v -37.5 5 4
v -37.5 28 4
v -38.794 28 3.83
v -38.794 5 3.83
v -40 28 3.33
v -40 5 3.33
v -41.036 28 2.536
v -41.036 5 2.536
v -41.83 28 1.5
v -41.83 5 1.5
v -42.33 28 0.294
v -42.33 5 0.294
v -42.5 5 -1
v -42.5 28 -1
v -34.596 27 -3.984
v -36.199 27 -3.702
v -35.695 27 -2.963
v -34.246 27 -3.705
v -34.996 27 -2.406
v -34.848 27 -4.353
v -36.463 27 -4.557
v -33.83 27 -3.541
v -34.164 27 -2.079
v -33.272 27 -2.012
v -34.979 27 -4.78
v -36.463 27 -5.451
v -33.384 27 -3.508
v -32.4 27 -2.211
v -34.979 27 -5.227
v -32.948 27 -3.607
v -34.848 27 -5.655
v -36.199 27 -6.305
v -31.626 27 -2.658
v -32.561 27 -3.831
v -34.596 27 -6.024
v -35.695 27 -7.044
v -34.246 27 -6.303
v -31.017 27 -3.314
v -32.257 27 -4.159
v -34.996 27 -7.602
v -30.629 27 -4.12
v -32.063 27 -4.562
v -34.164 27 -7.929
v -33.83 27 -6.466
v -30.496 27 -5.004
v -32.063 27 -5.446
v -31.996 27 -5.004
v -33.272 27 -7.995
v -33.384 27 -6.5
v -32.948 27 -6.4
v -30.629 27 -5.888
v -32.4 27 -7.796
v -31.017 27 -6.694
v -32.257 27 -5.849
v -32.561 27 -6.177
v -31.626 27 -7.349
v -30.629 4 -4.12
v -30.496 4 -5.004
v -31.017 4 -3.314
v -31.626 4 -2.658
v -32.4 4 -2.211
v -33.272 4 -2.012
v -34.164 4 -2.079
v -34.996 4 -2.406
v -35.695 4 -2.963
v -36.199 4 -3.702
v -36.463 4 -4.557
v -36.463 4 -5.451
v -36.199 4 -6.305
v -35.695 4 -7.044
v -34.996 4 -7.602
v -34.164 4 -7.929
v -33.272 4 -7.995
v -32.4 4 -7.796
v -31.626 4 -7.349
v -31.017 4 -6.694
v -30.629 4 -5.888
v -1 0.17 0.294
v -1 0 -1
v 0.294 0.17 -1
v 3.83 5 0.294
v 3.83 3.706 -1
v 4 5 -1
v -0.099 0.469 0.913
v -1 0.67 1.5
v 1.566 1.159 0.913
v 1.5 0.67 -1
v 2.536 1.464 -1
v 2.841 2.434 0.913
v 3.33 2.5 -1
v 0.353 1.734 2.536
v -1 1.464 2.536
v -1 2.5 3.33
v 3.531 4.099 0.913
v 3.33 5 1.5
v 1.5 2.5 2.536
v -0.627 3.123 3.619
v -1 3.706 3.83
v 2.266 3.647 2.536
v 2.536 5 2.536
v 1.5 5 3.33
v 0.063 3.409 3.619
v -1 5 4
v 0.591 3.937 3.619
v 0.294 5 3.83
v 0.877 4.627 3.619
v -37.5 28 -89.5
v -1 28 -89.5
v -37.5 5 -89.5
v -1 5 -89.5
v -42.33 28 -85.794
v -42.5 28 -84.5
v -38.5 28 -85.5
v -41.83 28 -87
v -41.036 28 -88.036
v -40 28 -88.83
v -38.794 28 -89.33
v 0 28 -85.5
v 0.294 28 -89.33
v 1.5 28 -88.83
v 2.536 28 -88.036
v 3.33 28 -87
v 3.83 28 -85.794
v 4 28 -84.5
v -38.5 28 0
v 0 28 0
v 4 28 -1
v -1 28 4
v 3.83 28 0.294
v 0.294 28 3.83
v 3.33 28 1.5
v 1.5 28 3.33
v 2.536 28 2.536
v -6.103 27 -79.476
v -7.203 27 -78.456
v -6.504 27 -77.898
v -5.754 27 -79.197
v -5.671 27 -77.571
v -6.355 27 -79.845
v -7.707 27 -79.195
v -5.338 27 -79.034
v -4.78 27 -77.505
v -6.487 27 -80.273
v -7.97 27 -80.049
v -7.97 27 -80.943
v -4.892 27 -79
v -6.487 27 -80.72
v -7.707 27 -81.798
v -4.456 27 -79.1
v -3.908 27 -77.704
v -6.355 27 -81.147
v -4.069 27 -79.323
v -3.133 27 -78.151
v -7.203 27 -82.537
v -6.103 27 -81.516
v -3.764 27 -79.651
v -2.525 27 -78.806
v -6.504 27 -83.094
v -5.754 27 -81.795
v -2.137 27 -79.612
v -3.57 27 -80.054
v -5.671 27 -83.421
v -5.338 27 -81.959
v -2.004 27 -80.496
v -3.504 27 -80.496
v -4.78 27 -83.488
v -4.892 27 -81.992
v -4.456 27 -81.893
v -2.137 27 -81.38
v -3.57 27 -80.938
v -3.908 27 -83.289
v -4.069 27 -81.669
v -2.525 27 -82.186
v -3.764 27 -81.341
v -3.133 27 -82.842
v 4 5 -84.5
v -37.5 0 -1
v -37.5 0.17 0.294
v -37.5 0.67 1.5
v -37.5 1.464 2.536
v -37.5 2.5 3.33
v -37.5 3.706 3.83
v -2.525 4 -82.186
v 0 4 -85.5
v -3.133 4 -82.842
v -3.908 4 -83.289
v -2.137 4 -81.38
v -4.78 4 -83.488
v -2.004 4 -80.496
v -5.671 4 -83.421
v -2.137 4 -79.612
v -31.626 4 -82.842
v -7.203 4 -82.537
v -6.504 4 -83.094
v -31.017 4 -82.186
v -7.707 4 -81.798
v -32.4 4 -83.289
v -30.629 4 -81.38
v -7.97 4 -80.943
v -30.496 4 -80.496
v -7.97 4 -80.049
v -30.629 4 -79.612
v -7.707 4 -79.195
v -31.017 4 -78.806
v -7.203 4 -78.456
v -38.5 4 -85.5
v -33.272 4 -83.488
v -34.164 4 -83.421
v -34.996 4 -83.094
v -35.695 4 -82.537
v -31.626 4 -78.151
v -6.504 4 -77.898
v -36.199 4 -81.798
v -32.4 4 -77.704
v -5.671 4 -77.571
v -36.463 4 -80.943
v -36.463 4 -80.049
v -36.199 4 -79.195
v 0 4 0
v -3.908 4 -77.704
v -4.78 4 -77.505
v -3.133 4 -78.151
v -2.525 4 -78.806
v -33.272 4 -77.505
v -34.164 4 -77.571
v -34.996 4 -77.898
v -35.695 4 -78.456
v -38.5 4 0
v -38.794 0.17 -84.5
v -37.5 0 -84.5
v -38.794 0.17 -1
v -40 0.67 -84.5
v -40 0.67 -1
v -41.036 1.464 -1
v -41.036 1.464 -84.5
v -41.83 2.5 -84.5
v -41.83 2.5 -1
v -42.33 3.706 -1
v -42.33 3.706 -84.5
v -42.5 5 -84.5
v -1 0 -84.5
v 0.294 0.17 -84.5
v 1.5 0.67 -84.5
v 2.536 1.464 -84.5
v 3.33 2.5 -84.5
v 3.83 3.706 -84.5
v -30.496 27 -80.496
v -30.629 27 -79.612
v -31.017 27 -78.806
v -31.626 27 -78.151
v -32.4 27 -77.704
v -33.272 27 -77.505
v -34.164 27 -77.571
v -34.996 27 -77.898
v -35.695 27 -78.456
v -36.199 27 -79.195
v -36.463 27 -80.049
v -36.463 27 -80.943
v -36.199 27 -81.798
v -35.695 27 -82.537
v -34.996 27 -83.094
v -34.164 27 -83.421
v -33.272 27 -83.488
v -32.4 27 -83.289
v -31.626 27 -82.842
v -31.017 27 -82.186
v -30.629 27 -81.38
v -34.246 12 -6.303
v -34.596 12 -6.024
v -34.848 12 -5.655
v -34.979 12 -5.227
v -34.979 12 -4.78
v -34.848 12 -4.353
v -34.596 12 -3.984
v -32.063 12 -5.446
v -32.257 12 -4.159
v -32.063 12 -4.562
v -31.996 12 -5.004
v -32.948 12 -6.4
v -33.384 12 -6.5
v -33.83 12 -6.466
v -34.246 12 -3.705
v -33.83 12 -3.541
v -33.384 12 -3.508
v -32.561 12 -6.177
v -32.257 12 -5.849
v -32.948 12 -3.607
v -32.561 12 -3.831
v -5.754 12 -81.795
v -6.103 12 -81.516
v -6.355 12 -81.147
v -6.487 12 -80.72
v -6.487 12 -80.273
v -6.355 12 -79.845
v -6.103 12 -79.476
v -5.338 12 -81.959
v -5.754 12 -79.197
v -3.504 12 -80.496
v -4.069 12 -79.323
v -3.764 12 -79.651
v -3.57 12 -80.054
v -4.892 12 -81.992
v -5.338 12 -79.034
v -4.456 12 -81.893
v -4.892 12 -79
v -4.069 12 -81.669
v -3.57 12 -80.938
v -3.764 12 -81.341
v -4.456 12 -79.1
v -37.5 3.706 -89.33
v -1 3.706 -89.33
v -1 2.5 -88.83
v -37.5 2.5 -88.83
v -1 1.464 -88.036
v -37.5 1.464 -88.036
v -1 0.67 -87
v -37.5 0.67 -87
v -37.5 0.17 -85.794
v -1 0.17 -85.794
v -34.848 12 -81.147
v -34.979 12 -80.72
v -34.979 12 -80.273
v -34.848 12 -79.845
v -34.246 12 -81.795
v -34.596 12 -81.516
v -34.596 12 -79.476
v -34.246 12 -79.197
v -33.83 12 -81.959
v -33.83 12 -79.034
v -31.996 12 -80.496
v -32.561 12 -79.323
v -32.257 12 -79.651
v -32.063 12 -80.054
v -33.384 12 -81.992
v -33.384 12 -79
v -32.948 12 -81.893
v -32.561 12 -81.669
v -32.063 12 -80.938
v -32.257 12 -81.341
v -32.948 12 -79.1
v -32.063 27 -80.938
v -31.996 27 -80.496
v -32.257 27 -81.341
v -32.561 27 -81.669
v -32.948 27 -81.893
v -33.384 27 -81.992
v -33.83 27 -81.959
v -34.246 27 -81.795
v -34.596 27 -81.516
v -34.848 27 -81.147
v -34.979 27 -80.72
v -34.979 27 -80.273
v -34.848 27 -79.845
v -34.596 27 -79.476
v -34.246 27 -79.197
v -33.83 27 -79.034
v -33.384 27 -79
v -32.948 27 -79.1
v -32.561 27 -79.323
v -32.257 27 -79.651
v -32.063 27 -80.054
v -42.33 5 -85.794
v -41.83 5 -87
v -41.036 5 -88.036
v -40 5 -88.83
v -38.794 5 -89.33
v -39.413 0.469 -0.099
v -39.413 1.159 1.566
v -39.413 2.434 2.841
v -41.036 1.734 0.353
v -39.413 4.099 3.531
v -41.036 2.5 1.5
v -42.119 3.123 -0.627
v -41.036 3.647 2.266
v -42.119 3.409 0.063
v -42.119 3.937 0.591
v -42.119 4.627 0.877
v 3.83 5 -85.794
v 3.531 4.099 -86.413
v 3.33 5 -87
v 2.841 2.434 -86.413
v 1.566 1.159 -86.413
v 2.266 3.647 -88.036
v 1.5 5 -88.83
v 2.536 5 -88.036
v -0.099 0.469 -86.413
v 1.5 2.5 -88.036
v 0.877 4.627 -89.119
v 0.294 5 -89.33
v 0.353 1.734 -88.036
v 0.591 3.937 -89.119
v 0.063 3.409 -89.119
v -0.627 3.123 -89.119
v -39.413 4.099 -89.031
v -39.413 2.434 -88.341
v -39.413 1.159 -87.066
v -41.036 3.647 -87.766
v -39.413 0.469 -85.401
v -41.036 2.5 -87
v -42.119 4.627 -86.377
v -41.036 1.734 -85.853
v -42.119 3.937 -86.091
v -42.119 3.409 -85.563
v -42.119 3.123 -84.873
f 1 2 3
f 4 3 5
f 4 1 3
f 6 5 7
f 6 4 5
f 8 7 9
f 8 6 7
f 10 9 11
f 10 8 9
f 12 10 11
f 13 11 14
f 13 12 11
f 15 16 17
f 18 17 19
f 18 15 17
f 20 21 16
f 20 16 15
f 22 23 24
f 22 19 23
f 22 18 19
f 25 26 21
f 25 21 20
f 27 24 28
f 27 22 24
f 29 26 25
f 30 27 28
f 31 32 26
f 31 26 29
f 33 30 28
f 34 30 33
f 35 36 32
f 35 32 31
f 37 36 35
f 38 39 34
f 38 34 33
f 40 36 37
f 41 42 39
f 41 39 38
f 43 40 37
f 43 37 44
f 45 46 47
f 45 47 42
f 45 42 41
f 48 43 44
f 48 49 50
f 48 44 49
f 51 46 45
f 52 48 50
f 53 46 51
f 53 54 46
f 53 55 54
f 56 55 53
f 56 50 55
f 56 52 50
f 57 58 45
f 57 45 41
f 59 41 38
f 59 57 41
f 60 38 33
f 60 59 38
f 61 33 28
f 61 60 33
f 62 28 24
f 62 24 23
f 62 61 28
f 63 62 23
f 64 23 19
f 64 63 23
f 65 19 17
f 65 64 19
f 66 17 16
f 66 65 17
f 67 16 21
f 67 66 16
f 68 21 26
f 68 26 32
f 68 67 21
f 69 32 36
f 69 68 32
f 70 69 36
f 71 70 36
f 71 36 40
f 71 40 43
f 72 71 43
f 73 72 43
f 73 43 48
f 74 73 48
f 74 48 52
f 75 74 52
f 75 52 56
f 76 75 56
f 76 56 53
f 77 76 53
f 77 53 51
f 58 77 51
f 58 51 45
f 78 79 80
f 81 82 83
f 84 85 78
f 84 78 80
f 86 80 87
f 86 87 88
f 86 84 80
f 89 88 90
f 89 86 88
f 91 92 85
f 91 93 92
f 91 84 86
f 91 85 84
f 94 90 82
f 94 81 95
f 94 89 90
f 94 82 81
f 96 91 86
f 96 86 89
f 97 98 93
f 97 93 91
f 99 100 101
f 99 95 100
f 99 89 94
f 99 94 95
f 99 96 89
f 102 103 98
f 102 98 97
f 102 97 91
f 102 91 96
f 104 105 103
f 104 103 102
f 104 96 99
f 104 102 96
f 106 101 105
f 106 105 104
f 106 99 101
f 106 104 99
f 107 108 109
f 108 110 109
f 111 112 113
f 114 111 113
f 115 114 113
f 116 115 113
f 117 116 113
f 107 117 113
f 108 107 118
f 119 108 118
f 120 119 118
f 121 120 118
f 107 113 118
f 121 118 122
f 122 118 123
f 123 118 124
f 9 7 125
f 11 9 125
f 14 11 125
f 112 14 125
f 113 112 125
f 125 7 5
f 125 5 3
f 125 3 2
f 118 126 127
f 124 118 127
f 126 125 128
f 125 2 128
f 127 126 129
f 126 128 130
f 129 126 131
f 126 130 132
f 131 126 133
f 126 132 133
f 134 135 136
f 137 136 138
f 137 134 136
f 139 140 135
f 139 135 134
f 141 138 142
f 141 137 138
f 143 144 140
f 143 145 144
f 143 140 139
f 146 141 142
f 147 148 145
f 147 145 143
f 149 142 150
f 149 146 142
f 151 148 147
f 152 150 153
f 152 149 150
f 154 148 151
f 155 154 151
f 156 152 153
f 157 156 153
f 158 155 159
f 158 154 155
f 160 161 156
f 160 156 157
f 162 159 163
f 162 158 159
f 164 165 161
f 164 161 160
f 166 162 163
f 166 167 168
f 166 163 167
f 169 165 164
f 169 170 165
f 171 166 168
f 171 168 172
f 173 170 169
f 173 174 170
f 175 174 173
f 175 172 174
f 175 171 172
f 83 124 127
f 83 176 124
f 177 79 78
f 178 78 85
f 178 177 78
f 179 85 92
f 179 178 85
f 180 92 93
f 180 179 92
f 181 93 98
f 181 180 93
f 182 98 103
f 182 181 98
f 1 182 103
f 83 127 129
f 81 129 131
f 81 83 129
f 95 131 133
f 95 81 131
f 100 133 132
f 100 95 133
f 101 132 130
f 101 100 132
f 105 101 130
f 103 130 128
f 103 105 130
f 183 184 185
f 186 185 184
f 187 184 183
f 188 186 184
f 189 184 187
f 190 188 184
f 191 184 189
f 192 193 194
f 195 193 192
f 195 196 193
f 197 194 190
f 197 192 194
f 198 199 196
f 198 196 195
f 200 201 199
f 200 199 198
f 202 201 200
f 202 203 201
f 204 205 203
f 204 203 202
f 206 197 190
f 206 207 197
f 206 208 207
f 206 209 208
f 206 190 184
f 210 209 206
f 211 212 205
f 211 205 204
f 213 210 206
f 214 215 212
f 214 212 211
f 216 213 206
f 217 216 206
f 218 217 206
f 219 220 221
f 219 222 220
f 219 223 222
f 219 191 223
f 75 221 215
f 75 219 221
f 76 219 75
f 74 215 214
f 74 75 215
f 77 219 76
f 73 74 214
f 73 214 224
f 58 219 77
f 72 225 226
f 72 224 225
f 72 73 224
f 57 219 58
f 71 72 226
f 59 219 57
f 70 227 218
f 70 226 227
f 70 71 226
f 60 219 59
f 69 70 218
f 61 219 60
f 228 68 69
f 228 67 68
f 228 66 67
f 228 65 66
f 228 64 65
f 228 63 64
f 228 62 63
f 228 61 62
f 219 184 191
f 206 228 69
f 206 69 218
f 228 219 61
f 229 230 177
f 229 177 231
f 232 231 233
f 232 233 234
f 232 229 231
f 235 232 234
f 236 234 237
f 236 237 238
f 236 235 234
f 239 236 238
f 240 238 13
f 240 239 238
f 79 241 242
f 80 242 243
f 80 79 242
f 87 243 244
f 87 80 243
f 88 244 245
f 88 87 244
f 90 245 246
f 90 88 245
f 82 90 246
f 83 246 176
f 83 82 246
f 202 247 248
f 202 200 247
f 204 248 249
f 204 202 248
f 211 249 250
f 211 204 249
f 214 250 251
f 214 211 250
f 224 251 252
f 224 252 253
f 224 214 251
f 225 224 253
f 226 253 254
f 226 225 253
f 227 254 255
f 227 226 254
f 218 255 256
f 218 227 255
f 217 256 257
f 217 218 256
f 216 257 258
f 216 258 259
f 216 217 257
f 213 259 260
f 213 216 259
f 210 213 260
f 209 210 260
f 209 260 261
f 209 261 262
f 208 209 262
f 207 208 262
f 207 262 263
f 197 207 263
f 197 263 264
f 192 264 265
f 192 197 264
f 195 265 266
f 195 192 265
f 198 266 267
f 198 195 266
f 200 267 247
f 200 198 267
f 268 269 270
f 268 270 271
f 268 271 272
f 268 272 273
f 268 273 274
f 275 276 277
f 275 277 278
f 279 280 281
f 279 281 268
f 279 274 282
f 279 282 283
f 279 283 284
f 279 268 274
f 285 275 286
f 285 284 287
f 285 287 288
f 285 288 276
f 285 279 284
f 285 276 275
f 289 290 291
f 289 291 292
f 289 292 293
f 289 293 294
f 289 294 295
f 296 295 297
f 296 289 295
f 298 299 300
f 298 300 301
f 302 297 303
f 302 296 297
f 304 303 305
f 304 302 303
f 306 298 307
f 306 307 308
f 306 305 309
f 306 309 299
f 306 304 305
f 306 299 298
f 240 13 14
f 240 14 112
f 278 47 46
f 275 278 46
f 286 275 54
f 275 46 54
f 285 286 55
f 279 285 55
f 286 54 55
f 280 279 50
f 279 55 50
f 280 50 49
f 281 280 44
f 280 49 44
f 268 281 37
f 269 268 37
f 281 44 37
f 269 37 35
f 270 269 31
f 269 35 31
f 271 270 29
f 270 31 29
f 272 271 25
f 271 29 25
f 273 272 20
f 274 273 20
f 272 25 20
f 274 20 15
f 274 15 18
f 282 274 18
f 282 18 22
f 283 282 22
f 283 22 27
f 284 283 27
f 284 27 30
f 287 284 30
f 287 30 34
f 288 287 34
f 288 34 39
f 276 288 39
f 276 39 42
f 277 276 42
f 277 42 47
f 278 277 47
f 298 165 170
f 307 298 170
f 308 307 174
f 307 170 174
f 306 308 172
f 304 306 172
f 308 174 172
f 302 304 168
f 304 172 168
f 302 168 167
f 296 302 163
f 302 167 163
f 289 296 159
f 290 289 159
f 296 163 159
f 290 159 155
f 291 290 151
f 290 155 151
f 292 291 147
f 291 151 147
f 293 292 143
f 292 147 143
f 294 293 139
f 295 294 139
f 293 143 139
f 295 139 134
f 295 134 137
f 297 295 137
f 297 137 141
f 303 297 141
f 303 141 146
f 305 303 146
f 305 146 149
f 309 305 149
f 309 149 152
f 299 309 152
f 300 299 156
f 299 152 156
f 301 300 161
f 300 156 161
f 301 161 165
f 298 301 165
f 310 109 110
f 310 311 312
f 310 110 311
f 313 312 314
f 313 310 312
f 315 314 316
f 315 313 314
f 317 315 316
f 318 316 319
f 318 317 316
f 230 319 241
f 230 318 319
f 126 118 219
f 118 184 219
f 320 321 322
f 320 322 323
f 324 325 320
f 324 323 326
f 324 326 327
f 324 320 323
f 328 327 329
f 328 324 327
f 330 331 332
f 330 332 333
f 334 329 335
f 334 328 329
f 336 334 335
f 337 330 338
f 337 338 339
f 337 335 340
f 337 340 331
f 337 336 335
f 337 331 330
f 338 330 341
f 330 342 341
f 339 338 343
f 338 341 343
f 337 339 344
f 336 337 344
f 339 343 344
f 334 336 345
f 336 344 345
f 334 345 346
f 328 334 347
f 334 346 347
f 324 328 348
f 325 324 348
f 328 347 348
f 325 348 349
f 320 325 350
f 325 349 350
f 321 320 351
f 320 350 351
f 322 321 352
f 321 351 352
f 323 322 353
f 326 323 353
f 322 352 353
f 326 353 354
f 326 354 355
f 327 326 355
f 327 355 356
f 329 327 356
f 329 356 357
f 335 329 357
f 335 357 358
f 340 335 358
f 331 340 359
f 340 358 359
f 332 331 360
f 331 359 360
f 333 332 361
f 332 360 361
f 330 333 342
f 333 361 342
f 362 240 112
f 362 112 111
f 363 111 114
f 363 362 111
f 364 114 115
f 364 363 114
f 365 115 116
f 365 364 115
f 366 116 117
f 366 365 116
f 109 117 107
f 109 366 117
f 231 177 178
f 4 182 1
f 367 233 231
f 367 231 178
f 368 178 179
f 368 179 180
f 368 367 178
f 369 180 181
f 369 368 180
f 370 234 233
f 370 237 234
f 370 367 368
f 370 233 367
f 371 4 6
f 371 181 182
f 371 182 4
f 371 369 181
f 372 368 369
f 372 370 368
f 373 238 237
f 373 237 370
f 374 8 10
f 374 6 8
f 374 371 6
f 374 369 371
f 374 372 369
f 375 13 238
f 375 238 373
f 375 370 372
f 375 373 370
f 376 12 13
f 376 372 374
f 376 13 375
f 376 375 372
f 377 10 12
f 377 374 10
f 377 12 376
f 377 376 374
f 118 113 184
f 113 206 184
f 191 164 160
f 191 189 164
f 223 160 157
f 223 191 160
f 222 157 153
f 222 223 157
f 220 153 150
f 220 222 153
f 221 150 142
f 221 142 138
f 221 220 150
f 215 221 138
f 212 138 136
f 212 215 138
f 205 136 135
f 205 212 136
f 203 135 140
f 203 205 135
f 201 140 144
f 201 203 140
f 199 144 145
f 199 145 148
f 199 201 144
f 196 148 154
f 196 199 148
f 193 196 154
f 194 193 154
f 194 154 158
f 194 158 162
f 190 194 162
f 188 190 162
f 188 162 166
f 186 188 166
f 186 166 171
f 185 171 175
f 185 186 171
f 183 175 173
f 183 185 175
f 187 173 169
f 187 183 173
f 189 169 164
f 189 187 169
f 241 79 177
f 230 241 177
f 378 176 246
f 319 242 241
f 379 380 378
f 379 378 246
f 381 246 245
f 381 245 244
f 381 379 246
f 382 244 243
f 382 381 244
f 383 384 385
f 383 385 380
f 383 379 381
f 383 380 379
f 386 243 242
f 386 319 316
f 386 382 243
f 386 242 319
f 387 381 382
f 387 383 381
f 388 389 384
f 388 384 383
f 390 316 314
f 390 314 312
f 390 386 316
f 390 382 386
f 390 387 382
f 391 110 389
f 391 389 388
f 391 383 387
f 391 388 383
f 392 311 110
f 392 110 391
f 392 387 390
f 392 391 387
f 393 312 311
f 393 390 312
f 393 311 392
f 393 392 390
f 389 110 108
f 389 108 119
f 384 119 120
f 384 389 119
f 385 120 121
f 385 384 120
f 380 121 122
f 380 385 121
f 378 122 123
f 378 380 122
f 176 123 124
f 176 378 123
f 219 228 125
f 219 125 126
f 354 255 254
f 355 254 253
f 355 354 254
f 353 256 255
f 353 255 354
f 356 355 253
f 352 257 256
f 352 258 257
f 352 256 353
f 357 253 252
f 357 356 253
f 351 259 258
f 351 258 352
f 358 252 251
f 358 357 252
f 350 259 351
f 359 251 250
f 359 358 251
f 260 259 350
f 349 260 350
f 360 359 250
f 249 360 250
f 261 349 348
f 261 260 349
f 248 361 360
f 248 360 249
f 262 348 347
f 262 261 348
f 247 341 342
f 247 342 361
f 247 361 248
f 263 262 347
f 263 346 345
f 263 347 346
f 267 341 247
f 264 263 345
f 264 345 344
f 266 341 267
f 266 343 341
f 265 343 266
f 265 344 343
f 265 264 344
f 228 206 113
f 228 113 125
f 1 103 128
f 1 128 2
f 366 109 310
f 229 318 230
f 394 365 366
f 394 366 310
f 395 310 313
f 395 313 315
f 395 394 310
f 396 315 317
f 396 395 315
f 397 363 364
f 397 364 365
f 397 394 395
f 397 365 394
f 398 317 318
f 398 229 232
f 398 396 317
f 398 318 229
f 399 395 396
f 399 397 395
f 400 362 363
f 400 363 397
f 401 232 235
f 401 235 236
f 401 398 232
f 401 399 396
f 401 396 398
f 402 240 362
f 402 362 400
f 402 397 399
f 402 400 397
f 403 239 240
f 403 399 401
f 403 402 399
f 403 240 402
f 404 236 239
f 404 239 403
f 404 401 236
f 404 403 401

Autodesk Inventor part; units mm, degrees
ref_plane "YZ Plane" through (0, 0, 0) normal (1, 0, 0) x (0, 1, 0)
ref_plane "XZ Plane" through (0, 0, 0) normal (0, 1, 0) x (-1, 0, 0)
ref_plane "XY Plane" through (0, 0, 0) normal (0, 0, 1) x (1, 0, 0)
sketch "Sketch2" plane through (0, 0, 0) normal (0, 1, 0) x (-1, 0, 0)
  line L0 (0, 0) -> (38.5, 0)
  line L1 (38.5, 0) -> (38.5, -85.5)
  line L2 (38.5, -85.5) -> (0, -85.5)
  line L3 (0, -85.5) -> (0, 0)
  dimension "d5" = 38.5
  dimension "d6" = 85.5
extrude "Extrusion2" add sketch "Sketch2" along normal blind 4
sketch "Sketch4" plane through (0, 0, 0) normal (0, -1, 0) x (1, 0, 0)
  line L0 (0, 0) -> (4, 0)
  line L1 (4, 0) -> (4, -85.5)
  line L2 (4, -85.5) -> (0, -85.5)
  line L3 (0, -85.5) -> (0, 0)
  line L4 (-38.5, 0) -> (0, 0) projected
  line L5 (-38.5, 0) -> (-42.5, 0)
  line L6 (-42.5, 0) -> (-42.5, -85.5)
  line L7 (-42.5, -85.5) -> (-38.5, -85.5)
  line L8 (-38.5, -85.5) -> (-38.5, 0)
  line L9 (-42.5, -85.5) -> (4, -85.5)
  line L10 (4, -85.5) -> (4, -89.5)
  line L11 (4, -89.5) -> (-42.5, -89.5)
  line L12 (-42.5, -89.5) -> (-42.5, -85.5)
  line L13 (-42.5, 0) -> (4, 0)
  line L14 (4, 0) -> (4, 4)
  line L15 (4, 4) -> (-42.5, 4)
  line L16 (-42.5, 4) -> (-42.5, 0)
  dimension "d13" = 4
  dimension "d14" = 4
  dimension "d15" = 4
  dimension "d16" = 4
extrude "Extrusion3" add sketch "Sketch4" against normal blind 28 contours L4 L5 L16 L15 L14 L0 | L0 L1 L2 L3 | L2 L10 L11 L12 L7 L9 | L8 L7 L6 L5
fillet "Fillet1" radius 5 4 edges at (-42.5, 0, -42.75) (-19.25, 0, -89.5) (4, 0, -42.75) (-19.25, 0, 4)
fillet "Fillet2" radius 5 2 edges at (-41.0355, 1.4645, 2.5355) (-42.5, 16.5, 4)
fillet "Fillet3" radius 5 6 edges at (2.5355, 1.4645, 2.5355) (4, 16.5, 4) (2.5355, 1.4645, -88.0355) (4, 16.5, -89.5) (-41.0355, 1.4645, -88.0355) (-42.5, 16.5, -89.5)
sketch "Sketch5" plane through (0, 4, 0) normal (0, 1, 0) x (1, 0, 0)
  line L0 (0, 85.5) -> (0, 0) projected
  line L1 (0, 0) -> (-5.0038, 0)
  line L2 (0, 5.0038) -> (0, 0)
  line L3 (0, 85.5) -> (-5.0038, 85.5)
  line L4 (-5.0038, 85.5) -> (-5.0038, 80.4962)
  line L5 (-5.0038, 80.4962) -> (0, 80.4962)
  line L6 (0, 80.4962) -> (0, 85.5)
  circle A0 centre (-5.0038, 80.4962) radius 3
  line L7 (0, 85.5) -> (-38.5, 85.5) projected
  line L8 (-38.5, 85.5) -> (-33.4962, 85.5)
  line L9 (-33.4962, 85.5) -> (-33.4962, 80.4962)
  line L10 (-33.4962, 80.4962) -> (-38.5, 80.4962)
  line L11 (-38.5, 80.4962) -> (-38.5, 85.5)
  circle A1 centre (-33.4962, 80.4962) radius 3
  line L12 (0, 0) -> (-38.5, 0) projected
  line L13 (-38.5, 0) -> (-33.4962, 0)
  line L14 (-33.4962, 0) -> (-33.4962, 5.0038)
  line L15 (-33.4962, 5.0038) -> (-38.5, 5.0038)
  line L16 (-38.5, 5.0038) -> (-38.5, 0)
  circle A2 centre (-33.4962, 5.0038) radius 3
  dimension "d25" = 5.0038
  dimension "d26" = 5.0038
  dimension "d27" = 6
  dimension "d28" = 5.0038
  dimension "d29" = 5.0038
  dimension "d30" = 6
  dimension "d31" = 5.0038
  dimension "d32" = 5.0038
  dimension "d33" = 6
extrude "Extrusion4" add sketch "Sketch5" along normal blind 23 contours A0 L4 L5 | L5 L4 A0 | A1 L10 L9 | L9 L10 A1 | A2 L15 L14 | L14 L15 A2
sketch "Sketch6" plane through (-33.4962, 27, -5.0038) normal (0, 1, 0) x (1, 0, 0)
  circle A0 centre (0, 0) radius 1.5
  point P0 (33.4962, -5.0038)
  dimension "d36" = 3
sketch "Sketch7" plane through (-33.4962, 27, -80.4962) normal (0, 1, 0) x (1, 0, 0)
  circle A0 centre (0, 0) radius 3 projected
  circle A1 centre (0, 0) radius 1.5
  point P0 (33.4962, -80.4962)
  dimension "d37" = 3
sketch "Sketch8" plane through (-5.0038, 27, -80.4962) normal (0, 1, 0) x (1, 0, 0)
  circle A0 centre (0, 0) radius 3 projected
  circle A1 centre (0, 0) radius 1.5
  point P0 (5.0038, -80.4962)
  dimension "d38" = 3
extrude "Extrusion5" cut sketch "Sketch6" against normal blind 15
extrude "Extrusion6" cut sketch "Sketch7" against normal blind 15 contours A1
extrude "Extrusion7" cut sketch "Sketch8" against normal blind 15 contours A1
properties part number "Bottomcase"
